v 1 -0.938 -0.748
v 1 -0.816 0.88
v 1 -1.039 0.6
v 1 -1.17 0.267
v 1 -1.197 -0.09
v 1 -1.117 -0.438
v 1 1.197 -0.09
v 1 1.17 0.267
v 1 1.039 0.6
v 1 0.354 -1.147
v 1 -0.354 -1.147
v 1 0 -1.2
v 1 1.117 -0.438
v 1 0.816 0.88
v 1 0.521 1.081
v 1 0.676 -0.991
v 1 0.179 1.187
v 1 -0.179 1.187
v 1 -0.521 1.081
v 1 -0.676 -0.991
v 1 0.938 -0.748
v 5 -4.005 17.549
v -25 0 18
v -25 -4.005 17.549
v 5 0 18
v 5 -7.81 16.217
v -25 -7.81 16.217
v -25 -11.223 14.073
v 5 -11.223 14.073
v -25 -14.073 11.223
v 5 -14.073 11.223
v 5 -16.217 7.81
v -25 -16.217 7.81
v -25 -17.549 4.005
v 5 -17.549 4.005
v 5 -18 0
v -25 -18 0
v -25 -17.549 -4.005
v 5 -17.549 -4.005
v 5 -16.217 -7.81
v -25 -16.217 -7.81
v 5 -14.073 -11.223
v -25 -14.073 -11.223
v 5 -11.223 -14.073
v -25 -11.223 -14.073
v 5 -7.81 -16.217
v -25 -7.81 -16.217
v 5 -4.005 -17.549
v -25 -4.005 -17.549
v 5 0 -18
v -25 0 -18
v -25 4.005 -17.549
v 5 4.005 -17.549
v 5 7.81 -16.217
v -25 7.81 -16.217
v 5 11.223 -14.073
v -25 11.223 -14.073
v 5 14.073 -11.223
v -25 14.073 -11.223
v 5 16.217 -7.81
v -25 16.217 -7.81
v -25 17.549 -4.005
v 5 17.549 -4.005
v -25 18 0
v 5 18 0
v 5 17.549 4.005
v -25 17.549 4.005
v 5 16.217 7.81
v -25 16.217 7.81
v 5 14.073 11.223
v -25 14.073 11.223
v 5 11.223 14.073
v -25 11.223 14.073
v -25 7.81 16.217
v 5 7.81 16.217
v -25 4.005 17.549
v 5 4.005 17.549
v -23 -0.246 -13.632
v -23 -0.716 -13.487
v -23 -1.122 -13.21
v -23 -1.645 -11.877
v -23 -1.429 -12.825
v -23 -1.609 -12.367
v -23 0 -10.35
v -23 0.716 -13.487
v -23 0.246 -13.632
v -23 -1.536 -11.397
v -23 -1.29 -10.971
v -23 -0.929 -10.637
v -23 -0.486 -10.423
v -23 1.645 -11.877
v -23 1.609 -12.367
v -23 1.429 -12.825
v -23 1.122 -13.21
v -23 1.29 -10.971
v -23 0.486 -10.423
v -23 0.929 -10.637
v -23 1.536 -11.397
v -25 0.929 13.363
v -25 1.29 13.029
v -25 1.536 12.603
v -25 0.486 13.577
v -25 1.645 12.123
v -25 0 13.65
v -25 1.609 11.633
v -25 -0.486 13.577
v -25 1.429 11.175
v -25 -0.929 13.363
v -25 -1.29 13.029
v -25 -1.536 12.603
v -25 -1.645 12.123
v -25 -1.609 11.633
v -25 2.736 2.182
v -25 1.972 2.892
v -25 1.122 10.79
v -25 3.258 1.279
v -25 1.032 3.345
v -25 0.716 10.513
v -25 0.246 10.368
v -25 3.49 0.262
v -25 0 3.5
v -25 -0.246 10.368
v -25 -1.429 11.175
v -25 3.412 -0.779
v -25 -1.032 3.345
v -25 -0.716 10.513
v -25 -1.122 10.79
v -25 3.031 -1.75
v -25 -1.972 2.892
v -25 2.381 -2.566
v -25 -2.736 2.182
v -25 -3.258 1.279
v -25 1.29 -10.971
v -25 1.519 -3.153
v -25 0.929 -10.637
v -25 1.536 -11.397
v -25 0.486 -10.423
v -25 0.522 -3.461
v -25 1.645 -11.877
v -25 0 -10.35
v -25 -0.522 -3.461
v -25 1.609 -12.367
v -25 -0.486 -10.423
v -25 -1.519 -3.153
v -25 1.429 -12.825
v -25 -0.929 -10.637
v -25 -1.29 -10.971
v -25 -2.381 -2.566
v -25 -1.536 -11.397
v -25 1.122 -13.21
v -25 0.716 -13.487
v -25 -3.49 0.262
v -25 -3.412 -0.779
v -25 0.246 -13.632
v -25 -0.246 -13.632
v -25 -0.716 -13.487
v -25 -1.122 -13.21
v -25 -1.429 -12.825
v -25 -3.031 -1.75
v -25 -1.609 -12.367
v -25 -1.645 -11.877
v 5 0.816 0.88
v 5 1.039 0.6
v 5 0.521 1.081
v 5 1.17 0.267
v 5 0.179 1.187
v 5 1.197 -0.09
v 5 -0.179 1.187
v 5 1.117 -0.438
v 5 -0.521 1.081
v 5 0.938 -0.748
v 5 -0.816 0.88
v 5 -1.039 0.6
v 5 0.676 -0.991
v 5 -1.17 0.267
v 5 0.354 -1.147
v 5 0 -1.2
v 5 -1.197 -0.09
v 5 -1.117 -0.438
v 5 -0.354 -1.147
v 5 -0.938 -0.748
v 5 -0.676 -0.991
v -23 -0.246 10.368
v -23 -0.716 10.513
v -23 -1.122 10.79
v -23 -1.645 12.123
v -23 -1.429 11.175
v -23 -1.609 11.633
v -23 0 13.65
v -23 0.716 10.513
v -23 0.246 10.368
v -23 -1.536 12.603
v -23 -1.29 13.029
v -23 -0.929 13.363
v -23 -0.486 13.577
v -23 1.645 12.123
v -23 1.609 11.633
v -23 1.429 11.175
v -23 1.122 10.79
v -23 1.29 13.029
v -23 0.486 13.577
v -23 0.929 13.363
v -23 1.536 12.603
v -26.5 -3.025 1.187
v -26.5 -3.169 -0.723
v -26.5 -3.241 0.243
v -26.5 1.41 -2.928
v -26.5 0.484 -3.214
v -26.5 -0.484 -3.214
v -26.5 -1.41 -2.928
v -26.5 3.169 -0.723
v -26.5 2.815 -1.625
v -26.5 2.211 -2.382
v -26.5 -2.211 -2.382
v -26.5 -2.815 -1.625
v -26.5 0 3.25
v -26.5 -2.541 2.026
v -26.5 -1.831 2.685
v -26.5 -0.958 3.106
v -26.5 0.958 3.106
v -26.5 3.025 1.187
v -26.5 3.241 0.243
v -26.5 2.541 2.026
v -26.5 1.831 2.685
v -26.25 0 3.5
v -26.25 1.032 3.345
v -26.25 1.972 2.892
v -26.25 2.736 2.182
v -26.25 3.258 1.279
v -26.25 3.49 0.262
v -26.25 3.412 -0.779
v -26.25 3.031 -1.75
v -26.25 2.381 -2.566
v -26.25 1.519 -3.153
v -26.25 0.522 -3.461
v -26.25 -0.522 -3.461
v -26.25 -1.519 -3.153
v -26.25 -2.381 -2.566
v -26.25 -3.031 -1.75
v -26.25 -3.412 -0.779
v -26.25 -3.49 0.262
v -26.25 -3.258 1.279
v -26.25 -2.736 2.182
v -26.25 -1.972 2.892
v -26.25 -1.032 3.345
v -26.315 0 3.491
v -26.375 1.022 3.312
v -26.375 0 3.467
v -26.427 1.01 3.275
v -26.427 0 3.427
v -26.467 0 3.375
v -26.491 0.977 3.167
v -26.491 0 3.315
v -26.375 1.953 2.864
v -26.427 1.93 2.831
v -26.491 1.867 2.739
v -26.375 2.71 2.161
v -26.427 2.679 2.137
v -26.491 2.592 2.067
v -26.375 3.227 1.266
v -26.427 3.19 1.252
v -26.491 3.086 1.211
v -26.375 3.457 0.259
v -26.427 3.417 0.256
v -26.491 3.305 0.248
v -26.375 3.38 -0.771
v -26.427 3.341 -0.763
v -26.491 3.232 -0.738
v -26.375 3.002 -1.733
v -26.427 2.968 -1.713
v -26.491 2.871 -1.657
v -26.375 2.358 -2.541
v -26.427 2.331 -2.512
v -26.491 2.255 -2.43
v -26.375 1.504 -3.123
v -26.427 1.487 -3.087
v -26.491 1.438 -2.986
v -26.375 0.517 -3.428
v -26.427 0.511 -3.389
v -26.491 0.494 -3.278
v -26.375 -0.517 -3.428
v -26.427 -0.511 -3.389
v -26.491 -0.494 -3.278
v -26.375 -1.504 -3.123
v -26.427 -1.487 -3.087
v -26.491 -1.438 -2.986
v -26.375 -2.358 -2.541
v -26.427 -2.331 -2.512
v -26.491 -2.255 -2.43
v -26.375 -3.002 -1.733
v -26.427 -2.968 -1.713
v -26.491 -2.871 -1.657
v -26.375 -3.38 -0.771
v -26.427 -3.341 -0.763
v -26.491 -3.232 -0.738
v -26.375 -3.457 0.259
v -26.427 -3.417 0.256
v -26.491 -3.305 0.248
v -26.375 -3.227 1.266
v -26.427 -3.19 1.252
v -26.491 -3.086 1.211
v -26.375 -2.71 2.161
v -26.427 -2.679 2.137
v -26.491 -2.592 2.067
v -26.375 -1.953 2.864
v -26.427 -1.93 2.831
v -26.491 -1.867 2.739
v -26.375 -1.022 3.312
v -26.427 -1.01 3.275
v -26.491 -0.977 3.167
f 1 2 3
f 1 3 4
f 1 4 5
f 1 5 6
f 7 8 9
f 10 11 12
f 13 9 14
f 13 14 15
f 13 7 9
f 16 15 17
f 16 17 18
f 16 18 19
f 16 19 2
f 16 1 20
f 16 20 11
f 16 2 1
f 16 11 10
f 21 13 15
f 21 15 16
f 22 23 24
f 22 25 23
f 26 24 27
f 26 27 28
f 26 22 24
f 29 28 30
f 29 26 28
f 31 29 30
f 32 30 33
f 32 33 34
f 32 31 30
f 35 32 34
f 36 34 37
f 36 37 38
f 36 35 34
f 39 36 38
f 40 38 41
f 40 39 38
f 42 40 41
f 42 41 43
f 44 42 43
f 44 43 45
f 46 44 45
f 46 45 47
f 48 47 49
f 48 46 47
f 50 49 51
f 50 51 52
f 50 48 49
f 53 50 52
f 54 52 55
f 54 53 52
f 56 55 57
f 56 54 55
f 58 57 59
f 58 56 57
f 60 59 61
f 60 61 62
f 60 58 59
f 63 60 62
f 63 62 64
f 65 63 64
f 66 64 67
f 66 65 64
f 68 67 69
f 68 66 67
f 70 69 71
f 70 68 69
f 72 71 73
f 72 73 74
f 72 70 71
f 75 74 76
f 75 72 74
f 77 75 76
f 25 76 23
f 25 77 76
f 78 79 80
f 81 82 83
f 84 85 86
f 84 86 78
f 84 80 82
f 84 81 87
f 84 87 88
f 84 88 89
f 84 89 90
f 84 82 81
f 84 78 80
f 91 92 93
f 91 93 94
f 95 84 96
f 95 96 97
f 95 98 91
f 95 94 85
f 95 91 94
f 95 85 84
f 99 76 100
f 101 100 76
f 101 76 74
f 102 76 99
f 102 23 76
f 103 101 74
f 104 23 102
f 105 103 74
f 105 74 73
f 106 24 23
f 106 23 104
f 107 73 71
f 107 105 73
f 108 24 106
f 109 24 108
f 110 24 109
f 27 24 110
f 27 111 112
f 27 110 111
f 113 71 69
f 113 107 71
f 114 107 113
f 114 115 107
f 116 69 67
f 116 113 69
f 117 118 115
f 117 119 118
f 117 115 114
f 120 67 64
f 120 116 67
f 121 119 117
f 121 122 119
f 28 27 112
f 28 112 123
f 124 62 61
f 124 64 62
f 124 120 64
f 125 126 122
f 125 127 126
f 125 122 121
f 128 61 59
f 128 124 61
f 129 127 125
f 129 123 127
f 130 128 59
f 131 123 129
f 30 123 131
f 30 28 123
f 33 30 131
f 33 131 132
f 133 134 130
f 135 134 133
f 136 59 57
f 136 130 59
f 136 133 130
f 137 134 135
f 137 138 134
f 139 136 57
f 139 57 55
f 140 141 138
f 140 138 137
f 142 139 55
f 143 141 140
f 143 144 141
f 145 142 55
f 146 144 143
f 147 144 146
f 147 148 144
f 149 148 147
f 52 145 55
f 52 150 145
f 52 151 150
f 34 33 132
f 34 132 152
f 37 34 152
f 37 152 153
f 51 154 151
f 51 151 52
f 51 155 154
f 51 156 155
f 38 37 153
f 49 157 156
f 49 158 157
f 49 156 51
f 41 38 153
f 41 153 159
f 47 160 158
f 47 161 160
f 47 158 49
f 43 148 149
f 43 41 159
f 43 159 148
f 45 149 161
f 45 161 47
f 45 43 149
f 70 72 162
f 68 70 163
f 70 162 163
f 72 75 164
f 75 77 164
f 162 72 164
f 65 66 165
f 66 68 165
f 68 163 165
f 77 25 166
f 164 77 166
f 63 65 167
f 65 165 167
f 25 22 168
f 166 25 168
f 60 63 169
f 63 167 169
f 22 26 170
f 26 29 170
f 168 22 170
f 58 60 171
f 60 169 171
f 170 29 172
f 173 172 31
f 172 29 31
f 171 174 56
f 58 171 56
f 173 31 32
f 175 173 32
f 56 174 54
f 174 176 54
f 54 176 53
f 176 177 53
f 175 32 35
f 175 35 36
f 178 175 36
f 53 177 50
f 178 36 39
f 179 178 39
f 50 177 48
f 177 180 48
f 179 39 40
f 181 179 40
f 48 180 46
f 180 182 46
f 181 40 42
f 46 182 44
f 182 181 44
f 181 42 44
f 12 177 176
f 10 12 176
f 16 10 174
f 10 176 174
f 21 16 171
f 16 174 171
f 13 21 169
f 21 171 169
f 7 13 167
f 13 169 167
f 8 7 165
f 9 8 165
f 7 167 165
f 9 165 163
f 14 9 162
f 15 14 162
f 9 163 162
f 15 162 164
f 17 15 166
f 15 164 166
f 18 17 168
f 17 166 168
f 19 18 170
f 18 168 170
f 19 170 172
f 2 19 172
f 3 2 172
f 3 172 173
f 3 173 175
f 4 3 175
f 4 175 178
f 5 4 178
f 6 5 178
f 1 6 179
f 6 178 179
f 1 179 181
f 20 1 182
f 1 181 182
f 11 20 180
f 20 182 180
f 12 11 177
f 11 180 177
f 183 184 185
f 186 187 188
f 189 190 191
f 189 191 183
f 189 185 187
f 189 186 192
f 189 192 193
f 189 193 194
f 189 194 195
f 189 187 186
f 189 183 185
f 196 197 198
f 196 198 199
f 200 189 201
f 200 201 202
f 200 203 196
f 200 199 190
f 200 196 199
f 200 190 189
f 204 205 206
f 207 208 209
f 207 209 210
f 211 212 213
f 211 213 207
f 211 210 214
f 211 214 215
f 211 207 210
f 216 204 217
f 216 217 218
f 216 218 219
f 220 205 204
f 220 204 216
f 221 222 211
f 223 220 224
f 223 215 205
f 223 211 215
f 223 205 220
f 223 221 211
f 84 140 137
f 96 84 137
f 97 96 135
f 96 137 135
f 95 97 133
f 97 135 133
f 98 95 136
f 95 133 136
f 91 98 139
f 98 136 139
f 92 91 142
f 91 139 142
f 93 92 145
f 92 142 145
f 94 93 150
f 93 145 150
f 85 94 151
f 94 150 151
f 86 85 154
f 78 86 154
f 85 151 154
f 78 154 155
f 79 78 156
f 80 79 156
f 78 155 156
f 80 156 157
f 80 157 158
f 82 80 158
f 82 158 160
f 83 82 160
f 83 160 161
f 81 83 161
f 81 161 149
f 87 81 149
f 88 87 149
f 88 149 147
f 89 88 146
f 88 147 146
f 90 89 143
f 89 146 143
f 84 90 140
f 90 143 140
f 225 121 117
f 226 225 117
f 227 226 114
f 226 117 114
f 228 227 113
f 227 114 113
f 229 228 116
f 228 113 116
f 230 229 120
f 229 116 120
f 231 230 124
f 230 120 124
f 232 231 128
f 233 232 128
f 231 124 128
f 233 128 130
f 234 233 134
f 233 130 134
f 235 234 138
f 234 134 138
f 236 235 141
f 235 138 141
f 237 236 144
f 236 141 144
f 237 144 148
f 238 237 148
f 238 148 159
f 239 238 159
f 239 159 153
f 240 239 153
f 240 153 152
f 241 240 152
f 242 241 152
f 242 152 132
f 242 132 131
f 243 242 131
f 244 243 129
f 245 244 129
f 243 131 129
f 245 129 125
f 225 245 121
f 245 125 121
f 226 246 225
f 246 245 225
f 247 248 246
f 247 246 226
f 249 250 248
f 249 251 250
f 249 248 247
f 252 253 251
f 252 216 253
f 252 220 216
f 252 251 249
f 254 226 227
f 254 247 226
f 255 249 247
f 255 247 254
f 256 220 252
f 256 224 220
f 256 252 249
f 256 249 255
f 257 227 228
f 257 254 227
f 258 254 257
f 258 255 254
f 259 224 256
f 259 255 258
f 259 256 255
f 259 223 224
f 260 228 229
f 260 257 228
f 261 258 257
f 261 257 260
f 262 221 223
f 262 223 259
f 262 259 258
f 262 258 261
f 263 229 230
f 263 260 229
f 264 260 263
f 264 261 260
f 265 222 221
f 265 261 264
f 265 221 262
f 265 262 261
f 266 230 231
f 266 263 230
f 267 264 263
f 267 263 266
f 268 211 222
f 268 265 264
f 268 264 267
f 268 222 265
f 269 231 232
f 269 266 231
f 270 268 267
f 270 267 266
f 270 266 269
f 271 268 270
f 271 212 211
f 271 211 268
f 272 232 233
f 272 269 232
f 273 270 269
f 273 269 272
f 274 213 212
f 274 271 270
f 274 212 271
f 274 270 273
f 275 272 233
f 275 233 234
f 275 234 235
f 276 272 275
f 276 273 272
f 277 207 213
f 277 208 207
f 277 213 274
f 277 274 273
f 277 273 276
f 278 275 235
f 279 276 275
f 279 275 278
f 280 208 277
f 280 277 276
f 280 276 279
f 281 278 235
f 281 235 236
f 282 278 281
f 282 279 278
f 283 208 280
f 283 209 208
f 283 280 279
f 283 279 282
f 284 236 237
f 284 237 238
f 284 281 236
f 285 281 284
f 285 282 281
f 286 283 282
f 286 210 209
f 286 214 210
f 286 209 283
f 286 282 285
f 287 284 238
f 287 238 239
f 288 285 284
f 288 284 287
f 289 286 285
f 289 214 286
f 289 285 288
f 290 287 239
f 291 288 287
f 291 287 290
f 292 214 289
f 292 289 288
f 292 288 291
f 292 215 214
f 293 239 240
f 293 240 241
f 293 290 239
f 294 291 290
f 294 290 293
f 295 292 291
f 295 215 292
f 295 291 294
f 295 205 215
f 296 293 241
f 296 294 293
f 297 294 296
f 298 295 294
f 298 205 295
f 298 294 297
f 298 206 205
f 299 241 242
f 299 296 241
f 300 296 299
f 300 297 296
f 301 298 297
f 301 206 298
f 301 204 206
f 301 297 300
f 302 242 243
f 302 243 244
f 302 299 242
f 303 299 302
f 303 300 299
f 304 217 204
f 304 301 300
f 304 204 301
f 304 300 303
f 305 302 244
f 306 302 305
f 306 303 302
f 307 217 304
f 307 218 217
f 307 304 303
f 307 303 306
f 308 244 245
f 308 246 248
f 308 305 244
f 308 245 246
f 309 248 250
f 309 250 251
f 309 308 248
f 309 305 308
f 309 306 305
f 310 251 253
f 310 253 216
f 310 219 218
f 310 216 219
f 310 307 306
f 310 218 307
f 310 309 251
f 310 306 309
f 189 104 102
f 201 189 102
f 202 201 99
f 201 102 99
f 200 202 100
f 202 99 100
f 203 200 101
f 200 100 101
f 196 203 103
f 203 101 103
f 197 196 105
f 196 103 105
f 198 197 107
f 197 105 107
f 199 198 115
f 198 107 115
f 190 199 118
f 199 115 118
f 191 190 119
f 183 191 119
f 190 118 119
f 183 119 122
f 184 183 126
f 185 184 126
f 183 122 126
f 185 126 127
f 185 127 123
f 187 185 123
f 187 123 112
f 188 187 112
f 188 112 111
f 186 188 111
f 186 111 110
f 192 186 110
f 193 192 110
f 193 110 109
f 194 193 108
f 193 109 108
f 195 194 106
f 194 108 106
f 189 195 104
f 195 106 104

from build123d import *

# Parameters (mm, degrees)
SKETCH1_W           = 30
SKETCH1_H           = 18
SKETCH2_R           = 1.2
CUT_EXTRUDE1_DEPTH  = 4
SKETCH3_R           = 3.5
BOSS_EXTRUDE1_DEPTH = 1.5
FILLET1_R           = 0.25
SKETCH4_R           = 1.65
CUT_EXTRUDE2_DEPTH  = 2


with BuildPart() as part:
    # Sketch1 → Revolve1 (revolve)
    with BuildSketch(Plane.XY, mode=Mode.PRIVATE) as revolve1_sk:
        with Locations((-10, 9)):
            Rectangle(SKETCH1_W, SKETCH1_H)
    revolve(revolve1_sk.sketch.rotate(Axis((-25, 0, 0), (1, 0, 0)), 90), axis=Axis((-25, 0, 0), (1, 0, 0)))

    # Sketch2 → Cut-Extrude1 (cut)
    with BuildSketch(Plane(origin=(5, 0, 0), x_dir=(0, 0, -1), z_dir=(1, 0, 0))):
        Circle(SKETCH2_R)
    extrude(amount=-CUT_EXTRUDE1_DEPTH, mode=Mode.SUBTRACT)

    # Sketch3 → Boss-Extrude1 (add)
    with BuildSketch(Plane.ZY.offset(25)):
        Circle(SKETCH3_R)
    extrude(amount=BOSS_EXTRUDE1_DEPTH)

    # Fillet1
    fillet1_edges = [part.edges().sort_by_distance(p)[0] for p in [
        (-26.5, 0, -3.5),
    ]]
    fillet(fillet1_edges, radius=FILLET1_R)

    # Sketch4 → Cut-Extrude2 (cut)
    with BuildSketch(Plane.ZY.offset(25)):
        with Locations((-12, 0)):
            Circle(SKETCH4_R)
        with Locations((12, 0)):
            Circle(SKETCH4_R)
    extrude(amount=-CUT_EXTRUDE2_DEPTH, mode=Mode.SUBTRACT)


solid = part.part
